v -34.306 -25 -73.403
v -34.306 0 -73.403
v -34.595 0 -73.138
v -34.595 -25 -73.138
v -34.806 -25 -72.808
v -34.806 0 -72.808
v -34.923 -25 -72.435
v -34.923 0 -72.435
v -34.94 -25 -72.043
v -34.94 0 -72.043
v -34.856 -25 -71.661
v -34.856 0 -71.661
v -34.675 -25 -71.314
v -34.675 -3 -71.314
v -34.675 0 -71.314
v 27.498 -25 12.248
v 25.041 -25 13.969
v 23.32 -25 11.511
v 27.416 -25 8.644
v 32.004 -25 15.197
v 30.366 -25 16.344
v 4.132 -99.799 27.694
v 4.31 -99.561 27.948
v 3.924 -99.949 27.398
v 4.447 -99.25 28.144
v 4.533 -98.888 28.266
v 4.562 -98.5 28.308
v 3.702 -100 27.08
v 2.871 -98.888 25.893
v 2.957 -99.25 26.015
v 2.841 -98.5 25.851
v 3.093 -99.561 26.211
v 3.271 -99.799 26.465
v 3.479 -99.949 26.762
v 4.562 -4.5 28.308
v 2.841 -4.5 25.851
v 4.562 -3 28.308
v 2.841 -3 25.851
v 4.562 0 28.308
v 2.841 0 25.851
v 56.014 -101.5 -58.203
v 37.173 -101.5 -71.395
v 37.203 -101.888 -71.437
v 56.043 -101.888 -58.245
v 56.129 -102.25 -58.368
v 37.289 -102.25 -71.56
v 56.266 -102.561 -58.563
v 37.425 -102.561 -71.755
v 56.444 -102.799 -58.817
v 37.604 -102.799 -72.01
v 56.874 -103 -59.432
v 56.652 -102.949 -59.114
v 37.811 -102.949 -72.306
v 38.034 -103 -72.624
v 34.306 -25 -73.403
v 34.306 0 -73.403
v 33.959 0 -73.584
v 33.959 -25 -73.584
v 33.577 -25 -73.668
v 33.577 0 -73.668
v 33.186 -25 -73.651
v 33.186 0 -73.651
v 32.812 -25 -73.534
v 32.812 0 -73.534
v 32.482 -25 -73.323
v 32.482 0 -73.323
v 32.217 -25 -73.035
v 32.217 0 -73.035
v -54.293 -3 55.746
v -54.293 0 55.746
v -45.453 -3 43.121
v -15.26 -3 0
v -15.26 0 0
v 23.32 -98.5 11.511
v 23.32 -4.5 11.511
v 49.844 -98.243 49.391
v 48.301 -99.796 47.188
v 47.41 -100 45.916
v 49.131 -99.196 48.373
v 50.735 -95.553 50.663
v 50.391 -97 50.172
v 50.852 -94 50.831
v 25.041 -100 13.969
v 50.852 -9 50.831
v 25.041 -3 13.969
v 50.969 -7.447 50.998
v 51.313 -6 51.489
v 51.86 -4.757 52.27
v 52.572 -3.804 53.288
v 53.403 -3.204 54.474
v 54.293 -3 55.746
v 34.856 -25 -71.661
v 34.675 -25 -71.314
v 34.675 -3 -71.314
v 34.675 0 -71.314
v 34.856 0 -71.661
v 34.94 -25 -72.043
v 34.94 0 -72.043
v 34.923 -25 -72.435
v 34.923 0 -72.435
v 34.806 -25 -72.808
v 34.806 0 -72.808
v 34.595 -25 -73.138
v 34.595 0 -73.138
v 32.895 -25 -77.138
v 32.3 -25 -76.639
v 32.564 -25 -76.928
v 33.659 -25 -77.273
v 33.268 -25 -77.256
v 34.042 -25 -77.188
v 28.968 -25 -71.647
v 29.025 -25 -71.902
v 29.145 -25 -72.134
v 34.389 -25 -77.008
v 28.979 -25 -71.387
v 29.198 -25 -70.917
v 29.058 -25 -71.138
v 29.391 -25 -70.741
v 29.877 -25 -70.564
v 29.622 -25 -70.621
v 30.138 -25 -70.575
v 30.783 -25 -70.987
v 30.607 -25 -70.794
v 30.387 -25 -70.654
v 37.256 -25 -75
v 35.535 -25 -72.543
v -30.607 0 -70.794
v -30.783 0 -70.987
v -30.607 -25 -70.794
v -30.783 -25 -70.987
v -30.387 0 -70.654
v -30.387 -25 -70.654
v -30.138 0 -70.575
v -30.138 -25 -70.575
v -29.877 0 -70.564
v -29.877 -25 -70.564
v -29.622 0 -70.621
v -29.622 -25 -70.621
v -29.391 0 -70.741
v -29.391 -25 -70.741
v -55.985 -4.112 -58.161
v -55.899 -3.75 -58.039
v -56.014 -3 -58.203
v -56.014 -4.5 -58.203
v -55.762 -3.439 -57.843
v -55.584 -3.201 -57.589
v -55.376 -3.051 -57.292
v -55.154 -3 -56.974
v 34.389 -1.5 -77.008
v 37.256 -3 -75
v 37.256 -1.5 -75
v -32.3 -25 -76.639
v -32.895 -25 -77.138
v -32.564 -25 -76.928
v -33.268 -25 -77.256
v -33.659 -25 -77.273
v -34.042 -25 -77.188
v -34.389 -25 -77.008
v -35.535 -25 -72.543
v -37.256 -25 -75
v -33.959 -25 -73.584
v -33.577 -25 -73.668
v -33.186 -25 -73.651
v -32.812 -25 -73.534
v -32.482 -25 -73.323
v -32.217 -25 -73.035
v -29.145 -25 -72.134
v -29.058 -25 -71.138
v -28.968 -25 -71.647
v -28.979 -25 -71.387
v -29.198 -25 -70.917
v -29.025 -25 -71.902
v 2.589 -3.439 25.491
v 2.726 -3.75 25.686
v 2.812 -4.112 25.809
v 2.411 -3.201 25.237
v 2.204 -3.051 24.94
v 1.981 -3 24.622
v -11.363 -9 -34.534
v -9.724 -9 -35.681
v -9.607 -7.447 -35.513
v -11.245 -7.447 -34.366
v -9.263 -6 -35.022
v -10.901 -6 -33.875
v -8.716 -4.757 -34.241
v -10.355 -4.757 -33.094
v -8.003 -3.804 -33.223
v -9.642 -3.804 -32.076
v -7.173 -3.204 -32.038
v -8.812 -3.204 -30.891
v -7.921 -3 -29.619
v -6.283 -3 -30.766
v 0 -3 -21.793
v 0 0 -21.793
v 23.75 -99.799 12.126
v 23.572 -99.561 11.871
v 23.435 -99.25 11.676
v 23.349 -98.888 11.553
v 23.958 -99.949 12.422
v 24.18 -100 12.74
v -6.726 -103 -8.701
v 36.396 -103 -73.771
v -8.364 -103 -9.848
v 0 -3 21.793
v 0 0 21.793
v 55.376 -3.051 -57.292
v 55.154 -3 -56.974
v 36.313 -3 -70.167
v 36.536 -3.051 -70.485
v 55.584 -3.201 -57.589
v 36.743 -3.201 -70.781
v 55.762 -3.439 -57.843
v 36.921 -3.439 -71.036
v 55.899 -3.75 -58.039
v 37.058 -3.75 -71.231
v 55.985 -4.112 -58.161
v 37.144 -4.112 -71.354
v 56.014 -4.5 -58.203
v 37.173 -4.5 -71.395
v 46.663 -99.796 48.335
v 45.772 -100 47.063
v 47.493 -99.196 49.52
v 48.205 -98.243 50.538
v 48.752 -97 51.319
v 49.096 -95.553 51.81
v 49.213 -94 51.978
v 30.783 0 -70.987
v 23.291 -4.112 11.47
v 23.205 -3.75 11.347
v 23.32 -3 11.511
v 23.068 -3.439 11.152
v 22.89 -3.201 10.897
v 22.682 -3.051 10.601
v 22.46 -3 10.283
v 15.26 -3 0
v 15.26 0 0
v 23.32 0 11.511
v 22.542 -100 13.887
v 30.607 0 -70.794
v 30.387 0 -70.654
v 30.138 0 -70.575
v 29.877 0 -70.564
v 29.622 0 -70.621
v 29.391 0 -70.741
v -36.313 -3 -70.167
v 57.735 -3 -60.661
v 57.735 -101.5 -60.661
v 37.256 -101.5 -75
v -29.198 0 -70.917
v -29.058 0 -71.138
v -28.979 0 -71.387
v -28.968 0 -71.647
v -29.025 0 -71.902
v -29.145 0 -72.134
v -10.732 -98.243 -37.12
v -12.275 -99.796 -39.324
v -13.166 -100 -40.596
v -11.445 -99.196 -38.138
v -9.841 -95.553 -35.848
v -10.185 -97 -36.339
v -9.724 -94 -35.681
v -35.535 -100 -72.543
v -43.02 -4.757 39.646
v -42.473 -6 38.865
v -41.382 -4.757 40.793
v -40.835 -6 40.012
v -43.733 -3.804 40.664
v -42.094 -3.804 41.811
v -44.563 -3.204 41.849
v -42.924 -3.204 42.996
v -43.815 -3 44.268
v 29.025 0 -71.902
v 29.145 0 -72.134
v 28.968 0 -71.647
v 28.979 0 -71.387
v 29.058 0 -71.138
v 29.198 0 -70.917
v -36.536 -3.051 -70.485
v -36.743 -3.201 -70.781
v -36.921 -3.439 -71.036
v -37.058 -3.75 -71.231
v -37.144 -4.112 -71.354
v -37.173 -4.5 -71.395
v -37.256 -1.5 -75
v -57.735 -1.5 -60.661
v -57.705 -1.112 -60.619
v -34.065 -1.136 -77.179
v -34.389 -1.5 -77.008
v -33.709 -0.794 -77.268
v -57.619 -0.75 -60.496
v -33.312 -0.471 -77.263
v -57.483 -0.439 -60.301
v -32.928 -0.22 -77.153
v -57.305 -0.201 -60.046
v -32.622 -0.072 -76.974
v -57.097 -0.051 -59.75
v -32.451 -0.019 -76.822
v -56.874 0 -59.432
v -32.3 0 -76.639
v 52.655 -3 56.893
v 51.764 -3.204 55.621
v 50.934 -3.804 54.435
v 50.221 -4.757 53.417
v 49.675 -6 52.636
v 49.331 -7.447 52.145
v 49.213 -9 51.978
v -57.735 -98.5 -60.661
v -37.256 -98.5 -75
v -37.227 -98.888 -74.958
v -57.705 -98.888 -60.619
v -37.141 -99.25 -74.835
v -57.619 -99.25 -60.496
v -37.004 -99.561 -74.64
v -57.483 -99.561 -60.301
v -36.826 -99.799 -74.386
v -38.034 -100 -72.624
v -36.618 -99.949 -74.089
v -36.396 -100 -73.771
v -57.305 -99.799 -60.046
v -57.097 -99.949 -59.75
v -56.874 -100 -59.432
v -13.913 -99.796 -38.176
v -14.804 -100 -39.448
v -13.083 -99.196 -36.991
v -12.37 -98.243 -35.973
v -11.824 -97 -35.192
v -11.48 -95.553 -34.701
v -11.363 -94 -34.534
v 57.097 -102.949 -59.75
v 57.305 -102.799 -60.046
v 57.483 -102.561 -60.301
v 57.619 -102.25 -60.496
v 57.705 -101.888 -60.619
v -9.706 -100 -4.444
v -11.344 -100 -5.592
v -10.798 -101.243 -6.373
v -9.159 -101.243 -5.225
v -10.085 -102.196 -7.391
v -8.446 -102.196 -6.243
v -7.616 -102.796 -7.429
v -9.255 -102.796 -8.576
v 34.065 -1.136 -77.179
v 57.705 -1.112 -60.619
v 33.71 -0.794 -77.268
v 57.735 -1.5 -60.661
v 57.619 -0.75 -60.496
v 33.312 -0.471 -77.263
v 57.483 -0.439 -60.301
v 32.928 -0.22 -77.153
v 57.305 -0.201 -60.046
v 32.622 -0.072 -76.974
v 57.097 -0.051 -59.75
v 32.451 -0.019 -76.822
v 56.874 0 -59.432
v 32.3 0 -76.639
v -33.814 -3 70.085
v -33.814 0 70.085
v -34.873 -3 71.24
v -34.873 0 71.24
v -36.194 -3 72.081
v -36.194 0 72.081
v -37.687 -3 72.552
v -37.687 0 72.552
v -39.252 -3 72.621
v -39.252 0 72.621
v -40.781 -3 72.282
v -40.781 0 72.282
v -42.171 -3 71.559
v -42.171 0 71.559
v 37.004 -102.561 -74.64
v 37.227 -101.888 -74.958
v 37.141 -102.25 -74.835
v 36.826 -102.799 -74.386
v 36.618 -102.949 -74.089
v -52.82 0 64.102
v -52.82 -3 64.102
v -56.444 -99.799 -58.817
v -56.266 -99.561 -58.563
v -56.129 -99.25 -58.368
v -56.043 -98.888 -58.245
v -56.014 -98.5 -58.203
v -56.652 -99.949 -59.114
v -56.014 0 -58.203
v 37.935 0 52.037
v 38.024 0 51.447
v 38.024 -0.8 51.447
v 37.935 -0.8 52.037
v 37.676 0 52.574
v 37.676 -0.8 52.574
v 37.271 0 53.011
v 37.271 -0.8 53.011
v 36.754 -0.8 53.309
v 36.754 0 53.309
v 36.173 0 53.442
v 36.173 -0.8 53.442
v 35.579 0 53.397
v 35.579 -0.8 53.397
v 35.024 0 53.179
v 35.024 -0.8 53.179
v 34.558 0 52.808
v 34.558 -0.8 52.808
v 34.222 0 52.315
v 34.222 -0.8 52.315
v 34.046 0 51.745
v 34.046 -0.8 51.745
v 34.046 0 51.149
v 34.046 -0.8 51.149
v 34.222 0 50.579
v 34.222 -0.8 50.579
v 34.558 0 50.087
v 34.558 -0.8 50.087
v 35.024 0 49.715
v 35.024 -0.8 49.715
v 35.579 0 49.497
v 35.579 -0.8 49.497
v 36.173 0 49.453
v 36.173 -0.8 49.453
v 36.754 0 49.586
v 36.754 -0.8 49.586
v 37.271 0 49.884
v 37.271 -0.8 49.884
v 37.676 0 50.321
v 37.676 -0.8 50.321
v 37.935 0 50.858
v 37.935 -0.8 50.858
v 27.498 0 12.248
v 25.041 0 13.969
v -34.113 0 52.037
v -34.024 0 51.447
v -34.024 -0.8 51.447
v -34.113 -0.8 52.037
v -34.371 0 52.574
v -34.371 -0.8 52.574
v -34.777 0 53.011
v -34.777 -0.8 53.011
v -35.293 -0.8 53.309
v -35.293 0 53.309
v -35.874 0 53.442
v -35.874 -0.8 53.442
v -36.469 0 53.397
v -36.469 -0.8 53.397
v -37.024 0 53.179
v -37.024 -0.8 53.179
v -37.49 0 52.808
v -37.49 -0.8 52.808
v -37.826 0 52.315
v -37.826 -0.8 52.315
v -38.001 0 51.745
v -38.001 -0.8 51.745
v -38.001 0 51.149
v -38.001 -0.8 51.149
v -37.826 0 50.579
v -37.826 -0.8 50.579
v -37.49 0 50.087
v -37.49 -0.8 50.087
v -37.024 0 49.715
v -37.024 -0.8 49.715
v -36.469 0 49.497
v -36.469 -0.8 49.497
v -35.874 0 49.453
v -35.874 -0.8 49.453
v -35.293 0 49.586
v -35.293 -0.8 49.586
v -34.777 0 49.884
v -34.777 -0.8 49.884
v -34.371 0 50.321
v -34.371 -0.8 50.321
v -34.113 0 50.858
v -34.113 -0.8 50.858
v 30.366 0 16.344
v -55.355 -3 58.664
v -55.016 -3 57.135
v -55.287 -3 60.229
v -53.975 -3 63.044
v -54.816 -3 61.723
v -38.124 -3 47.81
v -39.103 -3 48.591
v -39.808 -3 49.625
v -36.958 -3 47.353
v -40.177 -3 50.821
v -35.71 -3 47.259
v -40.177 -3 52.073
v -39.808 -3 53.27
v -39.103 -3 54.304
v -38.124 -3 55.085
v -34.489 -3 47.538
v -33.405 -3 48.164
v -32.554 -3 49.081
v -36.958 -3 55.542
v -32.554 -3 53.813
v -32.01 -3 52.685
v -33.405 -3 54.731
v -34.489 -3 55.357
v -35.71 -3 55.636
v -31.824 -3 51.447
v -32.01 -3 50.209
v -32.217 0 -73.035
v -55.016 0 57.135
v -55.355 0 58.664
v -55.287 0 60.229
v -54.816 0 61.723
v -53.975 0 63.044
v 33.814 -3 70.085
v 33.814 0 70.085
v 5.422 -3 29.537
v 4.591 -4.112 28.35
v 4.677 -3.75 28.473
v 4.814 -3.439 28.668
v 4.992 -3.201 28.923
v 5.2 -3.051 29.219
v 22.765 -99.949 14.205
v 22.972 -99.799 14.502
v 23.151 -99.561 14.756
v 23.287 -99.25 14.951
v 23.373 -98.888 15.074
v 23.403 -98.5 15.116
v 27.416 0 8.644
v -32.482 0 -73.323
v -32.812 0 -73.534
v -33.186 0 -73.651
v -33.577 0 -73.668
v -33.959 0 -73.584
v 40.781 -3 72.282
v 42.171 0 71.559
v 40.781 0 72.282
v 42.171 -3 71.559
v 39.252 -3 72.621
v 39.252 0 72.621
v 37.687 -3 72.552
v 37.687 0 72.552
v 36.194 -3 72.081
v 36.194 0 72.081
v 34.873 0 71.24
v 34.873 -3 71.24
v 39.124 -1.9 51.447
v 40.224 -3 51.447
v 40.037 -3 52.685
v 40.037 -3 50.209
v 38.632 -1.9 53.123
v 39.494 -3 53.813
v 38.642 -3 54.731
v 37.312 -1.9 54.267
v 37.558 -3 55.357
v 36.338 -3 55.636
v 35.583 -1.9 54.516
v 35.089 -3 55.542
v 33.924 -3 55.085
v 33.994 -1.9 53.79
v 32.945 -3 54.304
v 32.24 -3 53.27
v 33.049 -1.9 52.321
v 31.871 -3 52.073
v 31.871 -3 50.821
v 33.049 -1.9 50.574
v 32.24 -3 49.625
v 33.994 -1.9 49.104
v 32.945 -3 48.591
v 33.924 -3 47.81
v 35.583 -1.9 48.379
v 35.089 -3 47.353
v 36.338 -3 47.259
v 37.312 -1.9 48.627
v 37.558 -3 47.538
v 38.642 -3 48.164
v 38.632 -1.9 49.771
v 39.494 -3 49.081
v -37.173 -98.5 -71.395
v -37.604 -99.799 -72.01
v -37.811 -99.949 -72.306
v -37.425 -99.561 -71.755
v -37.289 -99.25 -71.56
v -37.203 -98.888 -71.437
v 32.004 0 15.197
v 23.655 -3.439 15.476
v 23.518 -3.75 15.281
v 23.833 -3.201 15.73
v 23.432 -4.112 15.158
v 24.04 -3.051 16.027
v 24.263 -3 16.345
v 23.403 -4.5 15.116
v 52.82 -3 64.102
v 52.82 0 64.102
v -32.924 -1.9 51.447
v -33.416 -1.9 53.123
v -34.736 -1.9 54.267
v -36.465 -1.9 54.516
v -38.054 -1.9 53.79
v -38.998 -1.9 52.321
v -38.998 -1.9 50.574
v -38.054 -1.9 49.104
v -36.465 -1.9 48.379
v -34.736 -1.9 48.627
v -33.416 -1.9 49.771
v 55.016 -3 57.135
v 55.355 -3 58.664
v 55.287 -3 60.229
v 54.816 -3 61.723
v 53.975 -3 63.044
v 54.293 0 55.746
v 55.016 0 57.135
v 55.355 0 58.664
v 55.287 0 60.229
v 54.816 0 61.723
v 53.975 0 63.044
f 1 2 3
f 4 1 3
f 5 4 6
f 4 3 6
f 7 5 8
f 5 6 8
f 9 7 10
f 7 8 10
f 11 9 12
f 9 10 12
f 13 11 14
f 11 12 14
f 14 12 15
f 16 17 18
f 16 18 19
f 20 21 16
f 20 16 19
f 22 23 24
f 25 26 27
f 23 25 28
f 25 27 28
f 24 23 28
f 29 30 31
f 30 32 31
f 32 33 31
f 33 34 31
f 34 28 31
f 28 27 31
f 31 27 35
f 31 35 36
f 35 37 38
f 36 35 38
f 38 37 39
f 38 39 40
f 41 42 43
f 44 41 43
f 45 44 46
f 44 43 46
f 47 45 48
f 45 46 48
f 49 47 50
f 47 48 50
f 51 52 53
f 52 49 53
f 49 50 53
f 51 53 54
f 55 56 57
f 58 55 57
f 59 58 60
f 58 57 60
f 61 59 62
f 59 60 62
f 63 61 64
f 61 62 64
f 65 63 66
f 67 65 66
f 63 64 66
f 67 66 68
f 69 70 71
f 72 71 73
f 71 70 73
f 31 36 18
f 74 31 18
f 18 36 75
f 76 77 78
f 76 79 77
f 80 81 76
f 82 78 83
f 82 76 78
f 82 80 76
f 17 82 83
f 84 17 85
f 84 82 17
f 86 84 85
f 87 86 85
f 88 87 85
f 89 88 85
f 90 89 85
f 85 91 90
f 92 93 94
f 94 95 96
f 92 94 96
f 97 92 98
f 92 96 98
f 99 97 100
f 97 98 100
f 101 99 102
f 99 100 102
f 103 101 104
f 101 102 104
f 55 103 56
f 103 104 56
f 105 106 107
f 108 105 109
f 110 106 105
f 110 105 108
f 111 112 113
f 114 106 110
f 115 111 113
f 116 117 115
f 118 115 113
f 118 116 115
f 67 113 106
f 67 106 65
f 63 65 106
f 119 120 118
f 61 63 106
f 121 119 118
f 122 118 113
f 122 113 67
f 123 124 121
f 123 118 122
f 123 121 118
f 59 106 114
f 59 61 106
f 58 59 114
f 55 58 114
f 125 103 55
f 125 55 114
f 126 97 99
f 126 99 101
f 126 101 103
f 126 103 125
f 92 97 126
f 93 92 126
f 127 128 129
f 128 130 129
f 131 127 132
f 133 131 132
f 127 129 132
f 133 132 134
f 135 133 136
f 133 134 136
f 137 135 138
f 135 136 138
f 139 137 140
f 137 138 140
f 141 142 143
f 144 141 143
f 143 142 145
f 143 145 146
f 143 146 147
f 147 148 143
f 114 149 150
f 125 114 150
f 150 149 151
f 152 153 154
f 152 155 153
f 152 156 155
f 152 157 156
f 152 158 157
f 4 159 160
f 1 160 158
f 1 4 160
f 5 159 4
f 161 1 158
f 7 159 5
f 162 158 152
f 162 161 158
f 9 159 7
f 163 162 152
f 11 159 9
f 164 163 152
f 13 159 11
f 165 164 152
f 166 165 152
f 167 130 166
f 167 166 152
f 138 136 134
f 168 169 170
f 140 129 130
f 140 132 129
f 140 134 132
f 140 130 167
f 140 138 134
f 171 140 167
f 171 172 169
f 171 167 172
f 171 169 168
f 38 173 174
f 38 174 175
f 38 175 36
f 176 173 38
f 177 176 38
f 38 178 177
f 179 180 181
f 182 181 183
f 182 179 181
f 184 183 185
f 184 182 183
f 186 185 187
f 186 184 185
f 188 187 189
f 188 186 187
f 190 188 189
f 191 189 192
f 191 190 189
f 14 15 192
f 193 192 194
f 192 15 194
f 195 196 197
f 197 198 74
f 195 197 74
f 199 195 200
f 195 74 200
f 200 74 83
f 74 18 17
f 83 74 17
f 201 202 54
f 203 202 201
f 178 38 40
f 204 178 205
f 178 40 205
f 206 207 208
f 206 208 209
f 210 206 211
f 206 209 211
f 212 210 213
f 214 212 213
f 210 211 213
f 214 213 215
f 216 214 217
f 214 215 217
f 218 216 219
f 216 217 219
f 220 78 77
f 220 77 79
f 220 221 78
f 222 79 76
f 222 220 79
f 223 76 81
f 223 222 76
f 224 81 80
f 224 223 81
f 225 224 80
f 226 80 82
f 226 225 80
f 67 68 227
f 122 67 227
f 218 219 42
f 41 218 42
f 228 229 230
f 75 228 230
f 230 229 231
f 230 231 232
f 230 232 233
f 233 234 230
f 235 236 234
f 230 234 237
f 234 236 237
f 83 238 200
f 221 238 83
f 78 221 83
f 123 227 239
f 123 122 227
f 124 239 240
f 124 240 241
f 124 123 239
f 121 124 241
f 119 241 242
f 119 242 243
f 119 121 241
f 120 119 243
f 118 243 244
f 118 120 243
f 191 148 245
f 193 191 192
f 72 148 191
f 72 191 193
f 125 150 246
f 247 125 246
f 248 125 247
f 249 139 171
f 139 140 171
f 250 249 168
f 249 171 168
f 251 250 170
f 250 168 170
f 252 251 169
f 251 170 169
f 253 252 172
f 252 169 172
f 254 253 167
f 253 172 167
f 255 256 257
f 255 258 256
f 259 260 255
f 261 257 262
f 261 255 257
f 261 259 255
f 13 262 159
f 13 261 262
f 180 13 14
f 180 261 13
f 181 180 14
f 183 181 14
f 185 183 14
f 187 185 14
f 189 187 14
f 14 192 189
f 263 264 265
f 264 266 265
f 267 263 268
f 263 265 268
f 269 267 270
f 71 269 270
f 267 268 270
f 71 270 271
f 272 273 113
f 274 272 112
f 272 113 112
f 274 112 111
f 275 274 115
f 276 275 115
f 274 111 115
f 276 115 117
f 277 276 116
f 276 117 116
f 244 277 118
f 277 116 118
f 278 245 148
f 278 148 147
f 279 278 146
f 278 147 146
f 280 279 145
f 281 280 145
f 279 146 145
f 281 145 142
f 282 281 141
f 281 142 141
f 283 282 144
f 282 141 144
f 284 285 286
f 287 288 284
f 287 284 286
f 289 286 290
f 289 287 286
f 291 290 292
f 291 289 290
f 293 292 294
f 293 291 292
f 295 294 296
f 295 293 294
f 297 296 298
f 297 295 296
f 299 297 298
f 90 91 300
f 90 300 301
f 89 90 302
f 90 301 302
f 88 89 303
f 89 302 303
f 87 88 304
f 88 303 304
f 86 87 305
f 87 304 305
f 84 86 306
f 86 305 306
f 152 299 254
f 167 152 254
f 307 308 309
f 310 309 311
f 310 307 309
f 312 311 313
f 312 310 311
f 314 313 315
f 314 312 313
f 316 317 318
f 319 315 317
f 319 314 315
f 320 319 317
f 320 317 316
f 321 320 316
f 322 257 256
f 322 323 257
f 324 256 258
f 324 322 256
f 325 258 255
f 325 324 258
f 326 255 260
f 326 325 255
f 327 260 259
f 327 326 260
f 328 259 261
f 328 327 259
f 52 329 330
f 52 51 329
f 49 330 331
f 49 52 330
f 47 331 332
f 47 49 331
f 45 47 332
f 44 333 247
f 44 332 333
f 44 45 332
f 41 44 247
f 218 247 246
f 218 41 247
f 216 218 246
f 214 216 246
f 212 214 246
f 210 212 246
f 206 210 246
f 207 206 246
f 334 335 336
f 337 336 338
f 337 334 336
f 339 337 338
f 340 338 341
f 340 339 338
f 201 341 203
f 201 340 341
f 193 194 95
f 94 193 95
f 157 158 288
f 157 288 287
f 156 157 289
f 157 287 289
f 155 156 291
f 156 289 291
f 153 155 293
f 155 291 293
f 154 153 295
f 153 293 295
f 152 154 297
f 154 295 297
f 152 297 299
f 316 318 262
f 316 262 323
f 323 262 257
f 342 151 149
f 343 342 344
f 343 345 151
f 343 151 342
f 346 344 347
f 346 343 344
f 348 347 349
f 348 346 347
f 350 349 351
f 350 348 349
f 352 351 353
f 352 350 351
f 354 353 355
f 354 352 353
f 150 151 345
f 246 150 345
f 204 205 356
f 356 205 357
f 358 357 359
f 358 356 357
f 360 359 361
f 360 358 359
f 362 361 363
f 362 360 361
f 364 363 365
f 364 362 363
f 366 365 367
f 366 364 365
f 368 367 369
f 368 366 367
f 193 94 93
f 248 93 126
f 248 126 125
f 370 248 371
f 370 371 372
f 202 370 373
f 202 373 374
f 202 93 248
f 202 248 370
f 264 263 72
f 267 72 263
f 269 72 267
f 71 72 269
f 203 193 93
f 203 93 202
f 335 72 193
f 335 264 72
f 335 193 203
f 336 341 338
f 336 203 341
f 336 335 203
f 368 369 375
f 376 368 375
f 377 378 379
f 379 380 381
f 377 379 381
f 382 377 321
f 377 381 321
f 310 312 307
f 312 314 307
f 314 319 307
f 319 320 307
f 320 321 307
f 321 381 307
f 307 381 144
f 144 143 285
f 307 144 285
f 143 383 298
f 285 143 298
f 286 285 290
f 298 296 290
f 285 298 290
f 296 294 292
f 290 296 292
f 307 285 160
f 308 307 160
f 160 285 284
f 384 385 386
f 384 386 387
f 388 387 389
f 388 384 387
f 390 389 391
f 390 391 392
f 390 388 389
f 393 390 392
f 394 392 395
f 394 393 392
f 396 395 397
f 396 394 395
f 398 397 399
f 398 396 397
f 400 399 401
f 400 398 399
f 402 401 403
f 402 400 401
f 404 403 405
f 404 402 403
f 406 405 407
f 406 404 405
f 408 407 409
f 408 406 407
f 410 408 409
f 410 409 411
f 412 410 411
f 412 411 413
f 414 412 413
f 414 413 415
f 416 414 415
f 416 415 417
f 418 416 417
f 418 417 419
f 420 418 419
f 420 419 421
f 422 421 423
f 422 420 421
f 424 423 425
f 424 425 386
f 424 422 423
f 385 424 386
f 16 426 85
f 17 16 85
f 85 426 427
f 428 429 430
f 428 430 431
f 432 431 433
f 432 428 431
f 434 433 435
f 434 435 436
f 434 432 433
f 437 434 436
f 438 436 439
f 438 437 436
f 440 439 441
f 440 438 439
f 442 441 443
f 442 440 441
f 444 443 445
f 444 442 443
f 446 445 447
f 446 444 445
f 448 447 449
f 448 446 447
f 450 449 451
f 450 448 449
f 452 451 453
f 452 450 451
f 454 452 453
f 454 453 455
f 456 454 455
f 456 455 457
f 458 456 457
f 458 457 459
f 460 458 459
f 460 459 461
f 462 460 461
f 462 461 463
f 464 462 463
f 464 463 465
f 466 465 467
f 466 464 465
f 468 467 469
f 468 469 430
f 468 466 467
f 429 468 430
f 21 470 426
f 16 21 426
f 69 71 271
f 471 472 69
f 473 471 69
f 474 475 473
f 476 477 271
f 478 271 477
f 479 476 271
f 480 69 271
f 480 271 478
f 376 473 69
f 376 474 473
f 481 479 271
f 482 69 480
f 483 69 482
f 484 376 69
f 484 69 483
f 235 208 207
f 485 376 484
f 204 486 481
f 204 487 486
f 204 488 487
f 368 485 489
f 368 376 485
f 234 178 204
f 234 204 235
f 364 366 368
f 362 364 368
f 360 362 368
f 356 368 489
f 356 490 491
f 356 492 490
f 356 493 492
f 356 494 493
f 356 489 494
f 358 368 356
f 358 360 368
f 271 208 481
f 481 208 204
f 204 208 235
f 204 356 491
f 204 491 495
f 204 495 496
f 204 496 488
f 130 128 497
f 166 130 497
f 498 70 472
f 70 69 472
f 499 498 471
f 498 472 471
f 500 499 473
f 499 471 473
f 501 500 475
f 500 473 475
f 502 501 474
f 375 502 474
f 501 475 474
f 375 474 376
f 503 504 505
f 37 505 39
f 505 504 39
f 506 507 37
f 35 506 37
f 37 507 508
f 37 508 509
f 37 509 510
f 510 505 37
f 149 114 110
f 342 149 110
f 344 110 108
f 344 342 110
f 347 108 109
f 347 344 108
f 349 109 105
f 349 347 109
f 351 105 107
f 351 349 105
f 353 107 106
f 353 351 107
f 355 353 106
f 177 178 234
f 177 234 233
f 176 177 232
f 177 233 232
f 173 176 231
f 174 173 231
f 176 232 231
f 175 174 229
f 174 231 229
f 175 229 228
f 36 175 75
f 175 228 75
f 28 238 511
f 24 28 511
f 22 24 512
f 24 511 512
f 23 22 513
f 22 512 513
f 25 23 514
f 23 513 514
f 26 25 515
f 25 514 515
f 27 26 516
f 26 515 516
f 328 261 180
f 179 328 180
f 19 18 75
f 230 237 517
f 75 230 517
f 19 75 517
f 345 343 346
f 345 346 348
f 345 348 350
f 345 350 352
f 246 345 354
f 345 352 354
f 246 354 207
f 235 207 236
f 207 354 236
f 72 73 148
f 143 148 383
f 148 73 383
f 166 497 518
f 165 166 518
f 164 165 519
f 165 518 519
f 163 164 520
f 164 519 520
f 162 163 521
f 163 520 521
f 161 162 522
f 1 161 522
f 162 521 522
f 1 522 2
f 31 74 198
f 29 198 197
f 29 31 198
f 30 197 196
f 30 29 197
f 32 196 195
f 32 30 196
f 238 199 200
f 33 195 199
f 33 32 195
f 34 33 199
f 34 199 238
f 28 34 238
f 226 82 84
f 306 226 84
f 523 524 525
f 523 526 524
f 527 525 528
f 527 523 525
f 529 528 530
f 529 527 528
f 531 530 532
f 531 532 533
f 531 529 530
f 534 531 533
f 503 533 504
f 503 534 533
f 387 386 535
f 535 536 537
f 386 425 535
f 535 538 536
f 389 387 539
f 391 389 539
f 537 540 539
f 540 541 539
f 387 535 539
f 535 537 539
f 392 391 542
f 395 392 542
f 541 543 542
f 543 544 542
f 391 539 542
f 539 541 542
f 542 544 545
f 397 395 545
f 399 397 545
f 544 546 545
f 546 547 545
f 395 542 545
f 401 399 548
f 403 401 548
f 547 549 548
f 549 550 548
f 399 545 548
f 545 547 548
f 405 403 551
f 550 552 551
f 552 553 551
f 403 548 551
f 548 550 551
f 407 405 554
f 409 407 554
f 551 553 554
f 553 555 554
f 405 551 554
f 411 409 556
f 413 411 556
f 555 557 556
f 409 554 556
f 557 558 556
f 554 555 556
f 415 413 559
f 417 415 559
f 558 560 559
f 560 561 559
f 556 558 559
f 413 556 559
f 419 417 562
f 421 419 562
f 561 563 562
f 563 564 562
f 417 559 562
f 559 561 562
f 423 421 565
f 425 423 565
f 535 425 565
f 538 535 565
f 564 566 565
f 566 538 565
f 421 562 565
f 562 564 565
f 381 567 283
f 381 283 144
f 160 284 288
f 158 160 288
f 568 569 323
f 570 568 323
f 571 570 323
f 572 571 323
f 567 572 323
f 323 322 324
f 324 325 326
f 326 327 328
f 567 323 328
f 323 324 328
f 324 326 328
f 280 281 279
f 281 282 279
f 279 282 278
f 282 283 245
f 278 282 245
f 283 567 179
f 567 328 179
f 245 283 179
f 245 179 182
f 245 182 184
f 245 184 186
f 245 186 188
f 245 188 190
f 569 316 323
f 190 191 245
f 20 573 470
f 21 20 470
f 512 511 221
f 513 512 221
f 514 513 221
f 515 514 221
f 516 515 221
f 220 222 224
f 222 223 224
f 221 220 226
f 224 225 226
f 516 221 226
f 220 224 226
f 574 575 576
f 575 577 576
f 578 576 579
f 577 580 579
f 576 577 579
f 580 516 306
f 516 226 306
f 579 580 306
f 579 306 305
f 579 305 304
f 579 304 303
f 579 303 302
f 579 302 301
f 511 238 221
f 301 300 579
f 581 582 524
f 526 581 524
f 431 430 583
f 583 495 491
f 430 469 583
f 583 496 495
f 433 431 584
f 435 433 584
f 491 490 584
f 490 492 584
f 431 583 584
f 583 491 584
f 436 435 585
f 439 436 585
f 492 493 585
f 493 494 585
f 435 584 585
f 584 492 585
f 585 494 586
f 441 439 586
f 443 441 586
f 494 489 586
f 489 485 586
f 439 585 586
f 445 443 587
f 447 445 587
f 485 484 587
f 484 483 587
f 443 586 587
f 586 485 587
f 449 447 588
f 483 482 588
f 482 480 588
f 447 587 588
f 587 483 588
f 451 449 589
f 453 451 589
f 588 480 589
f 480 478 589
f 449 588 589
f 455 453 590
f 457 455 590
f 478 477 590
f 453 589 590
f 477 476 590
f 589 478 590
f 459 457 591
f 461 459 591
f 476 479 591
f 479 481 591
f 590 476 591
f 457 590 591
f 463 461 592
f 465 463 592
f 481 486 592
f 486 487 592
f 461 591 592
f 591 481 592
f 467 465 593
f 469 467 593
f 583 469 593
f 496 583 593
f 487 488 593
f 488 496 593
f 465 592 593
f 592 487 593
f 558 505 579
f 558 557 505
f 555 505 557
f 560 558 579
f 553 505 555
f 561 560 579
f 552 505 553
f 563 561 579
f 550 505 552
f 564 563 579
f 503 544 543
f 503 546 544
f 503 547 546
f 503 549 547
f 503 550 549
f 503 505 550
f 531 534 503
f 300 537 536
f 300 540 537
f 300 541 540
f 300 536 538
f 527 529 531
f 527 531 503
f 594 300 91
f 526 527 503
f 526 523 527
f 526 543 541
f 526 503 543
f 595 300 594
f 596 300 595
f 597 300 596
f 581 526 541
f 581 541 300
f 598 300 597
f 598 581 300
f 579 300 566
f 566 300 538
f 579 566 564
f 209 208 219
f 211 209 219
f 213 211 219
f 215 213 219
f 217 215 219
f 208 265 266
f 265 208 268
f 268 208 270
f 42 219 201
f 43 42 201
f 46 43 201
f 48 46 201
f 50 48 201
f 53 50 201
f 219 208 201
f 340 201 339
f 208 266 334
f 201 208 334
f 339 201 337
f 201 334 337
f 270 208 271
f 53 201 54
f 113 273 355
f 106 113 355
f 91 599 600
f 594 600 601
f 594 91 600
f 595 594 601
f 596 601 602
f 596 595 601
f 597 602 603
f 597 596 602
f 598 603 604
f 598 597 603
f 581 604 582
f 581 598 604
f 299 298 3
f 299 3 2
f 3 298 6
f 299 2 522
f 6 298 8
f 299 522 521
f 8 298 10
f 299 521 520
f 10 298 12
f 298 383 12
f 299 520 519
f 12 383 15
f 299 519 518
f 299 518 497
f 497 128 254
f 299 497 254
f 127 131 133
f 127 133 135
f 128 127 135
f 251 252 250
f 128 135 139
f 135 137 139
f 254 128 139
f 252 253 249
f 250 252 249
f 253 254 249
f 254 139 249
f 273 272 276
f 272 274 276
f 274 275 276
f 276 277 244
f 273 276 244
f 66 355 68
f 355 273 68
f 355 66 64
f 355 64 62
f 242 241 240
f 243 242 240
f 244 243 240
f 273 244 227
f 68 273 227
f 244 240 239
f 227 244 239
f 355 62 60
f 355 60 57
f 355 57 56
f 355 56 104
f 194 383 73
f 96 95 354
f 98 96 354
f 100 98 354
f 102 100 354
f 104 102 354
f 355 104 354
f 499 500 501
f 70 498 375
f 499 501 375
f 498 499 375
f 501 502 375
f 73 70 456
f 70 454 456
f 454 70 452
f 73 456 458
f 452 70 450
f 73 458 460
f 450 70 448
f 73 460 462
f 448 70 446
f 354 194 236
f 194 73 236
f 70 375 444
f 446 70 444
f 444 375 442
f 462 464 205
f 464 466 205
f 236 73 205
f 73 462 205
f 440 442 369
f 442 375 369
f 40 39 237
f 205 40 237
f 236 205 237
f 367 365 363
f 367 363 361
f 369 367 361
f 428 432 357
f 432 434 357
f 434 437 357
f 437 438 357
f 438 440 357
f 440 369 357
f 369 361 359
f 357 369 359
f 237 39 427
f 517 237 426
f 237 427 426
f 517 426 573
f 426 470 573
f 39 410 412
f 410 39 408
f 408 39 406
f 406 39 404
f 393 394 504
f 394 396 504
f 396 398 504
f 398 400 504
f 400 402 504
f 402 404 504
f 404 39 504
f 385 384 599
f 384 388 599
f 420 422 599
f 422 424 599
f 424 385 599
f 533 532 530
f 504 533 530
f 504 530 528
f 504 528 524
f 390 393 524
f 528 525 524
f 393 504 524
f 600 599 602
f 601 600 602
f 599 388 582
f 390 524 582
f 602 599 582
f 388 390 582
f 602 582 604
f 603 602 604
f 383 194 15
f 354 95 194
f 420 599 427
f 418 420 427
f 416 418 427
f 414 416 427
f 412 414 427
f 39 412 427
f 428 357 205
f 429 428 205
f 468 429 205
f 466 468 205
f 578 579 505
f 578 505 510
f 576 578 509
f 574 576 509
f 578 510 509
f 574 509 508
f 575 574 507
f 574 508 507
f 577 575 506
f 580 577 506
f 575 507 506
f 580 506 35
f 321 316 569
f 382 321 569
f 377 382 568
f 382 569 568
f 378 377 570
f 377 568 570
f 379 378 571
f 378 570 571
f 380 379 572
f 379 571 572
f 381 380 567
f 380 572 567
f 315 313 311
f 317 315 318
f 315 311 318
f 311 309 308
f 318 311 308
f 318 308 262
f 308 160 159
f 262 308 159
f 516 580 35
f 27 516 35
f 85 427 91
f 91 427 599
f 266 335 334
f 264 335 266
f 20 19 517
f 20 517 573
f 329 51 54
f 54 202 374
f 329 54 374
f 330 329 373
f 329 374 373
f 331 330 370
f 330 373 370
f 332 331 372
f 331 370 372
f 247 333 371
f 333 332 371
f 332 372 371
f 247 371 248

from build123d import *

# Parameters (mm, degrees)
F0_R          = 2
F1_DEPTH      = 3
F4_DEPTH      = 2
F3_W          = 100
F3_H          = 3
F5_DEPTH      = 25
F6_DEPTH      = 25
F7_DEPTH      = 100
F9_W          = 97
F9_H          = 45
F10_DEPTH     = 2
F11_R         = 5.99999
F12_T1_DEPTH  = 23
F12_T3_DEPTH  = 25
F12_T5_DEPTH  = 23
F12_T7_DEPTH  = 25
F12_T9_DEPTH  = 32.5
F12_T11_DEPTH = 26.75
F12_T13_DEPTH = 32.5
F12_T15_DEPTH = 26.75
F12_T17_DEPTH = 37.5
F12_T19_DEPTH = 37.5
F12_T21_DEPTH = 32.5
F13_R         = 0.99999
F14_SIZE      = 2.2


# Not quite as in the source:
# - a fillet or chamfer that OpenCascade refuses, or shapes differently, is made with other operations: its cross-section is extruded or revolved along the edge and cut away or added
# - a fillet or chamfer is up to 0.001 mm smaller than in the source, because OpenCascade refuses the exact size
# - a feature names something its author has since deleted; it is built from what else it names


with BuildPart() as f1:
    # F0 (on Front) → F1 (new body)
    with BuildSketch(Plane.XZ):
        Polygon((-15.2596823595, 0), (0, 21.7930849453), (-37.2558830062, 75), (-57.7346841134, 60.6605890912), align=None)
        with Locations((-36.0237548328, 51.4472536598)):
            Circle(F0_R, mode=Mode.SUBTRACT)
        Polygon((0, -21.7930849453), (15.2596823595, 0), (0, 21.7930849453), (-15.2596823595, 0), align=None)
        Polygon((25.0408272414, 13.9689225668), (57.7346841134, 60.6605890912), (37.2558830062, 75), (4.5620261342, 28.3083334755), align=None)
        with Locations((36.0237548328, 51.4472536598)):
            Circle(F0_R, mode=Mode.SUBTRACT)
        Polygon((15.2596823595, 0), (23.3200979324, 11.5114664339), (2.8412968251, 25.8508773427), (0, 21.7930849453), align=None)
        Polygon((23.3200979324, 11.5114664339), (25.0408272414, 13.9689225668), (4.5620261342, 28.3083334755), (2.8412968251, 25.8508773427), align=None)
        Polygon((-35.5351536972, -72.5425438671), (0, -21.7930849453), (-15.2596823595, 0), (-56.0139548044, -58.2031329584), align=None)
        Polygon((57.7346841134, -60.6605890912), (15.2596823595, 0), (0, -21.7930849453), (35.5351536972, -72.5425438671), (37.2558830062, -75), align=None)
        Polygon((-37.2558830062, -75), (-35.5351536972, -72.5425438671), (-56.0139548044, -58.2031329584), (-57.7346841134, -60.6605890912), align=None)
    extrude(amount=F1_DEPTH)

    # F3 (on offset) → F4 (join)
    with BuildSketch(Plane(origin=(-10.2394005536, 0, -7.1697054544), x_dir=(0, -1, 0), z_dir=(-0.8191520443, 0, -0.5735764364))):
        Polygon((3, -79.8054999295), (103, -79.8054999295), (103, 0.1945000705), (83, 0.1945000705), (90.1471648731, -3.9319174929), (90.1471648731, -52.514305784), (48.0735824366, -76.8054999295), (6, -52.514305784), (6, -3.9319174929), (13.1471648731, 0.1945000705), (3, 0.1945000705), align=None)
        Polygon((83, 0.1945000705), (103, 0.1945000705), (3, 57.9295269895), (3, 0.1945000705), (13.1471648731, 0.1945000705), (48.0735824366, 20.3592766526), align=None)
        Polygon((90.1471648731, -3.9319174929), (83, 0.1945000705), (13.1471648731, 0.1945000705), (6, -3.9319174929), (6, -52.514305784), (48.0735824366, -76.8054999295), (90.1471648731, -52.514305784), align=None)
        Polygon((13.1471648731, 0.1945000705), (83, 0.1945000705), (48.0735824366, 20.3592766526), align=None)
    extrude(amount=-F4_DEPTH)

    # F3 (on offset) → F5 (join)
    with BuildSketch(Plane(origin=(-10.2394005536, 0, -7.1697054544), x_dir=(0, -1, 0), z_dir=(-0.8191520443, 0, -0.5735764364))):
        with Locations((53, -81.3054999295)):
            Rectangle(F3_W, F3_H)
    extrude(amount=-F5_DEPTH)

    # F0 (on Front) → F6 (join)
    with BuildSketch(Plane.XZ):
        Polygon((-33.0776975643, -74.2632731762), (-35.5351536972, -72.5425438671), (-37.2558830062, -75), (-33.1601227848, -77.8678821818), (-28.571511294, -71.3146658274), (-30.2098153825, -70.1675129547), align=None)
        Polygon((37.2558830062, -75), (35.5351536972, -72.5425438671), (33.0776975643, -74.2632731762), (30.2098153825, -70.1675129547), (28.571511294, -71.3146658274), (33.1601227848, -77.8678821818), align=None)
        Polygon((27.4982833743, 12.2481932577), (25.0408272414, 13.9689225668), (23.3200979324, 11.5114664339), (27.4158581538, 8.6435842521), (32.0044696446, 15.1968006064), (30.366165556, 16.3439534791), align=None)
    extrude(amount=F6_DEPTH)

    # F0 (on Front) → F7 (join)
    with BuildSketch(Plane.XZ):
        Polygon((-37.2558830062, -75), (-35.5351536972, -72.5425438671), (-56.0139548044, -58.2031329584), (-57.7346841134, -60.6605890912), align=None)
        Polygon((23.3200979324, 11.5114664339), (25.0408272414, 13.9689225668), (4.5620261342, 28.3083334755), (2.8412968251, 25.8508773427), align=None)
    extrude(amount=F7_DEPTH)

    # F9 (on offset) → F10 (join)
    with BuildSketch(Plane(origin=(10.2394005536, 0, -7.1697054544), x_dir=(0, 1, 0), z_dir=(0.8191520443, 0, -0.5735764364))):
        with Locations((-51.5, -57.3054999295)):
            Rectangle(F9_W, F9_H)
        Polygon((-94, -57.3054999295), (-84.4737205584, -40.8054999295), (-65.4211616751, -40.8054999295), (-55.8948822335, -57.3054999295), (-65.4211616751, -73.8054999295), (-84.4737205584, -73.8054999295), align=None, mode=Mode.SUBTRACT)
        Polygon((-9, -57.3054999295), (-18.5262794416, -73.8054999295), (-37.5788383249, -73.8054999295), (-47.1051177665, -57.3054999295), (-37.5788383249, -40.8054999295), (-18.5262794416, -40.8054999295), align=None, mode=Mode.SUBTRACT)
        with Locations((-51.5, 48.3054999295)):
            Rectangle(F9_W, F9_H)
        Polygon((-55.8948822335, 48.3054999295), (-65.4211616751, 31.8054999295), (-84.4737205584, 31.8054999295), (-94, 48.3054999295), (-84.4737205584, 64.8054999295), (-65.4211616751, 64.8054999295), align=None, mode=Mode.SUBTRACT)
        Polygon((-9, 48.3054999295), (-18.5262794416, 31.8054999295), (-37.5788383249, 31.8054999295), (-47.1051177665, 48.3054999295), (-37.5788383249, 64.8054999295), (-18.5262794416, 64.8054999295), align=None, mode=Mode.SUBTRACT)
        Polygon((-84.4737205584, 31.8054999295), (-65.4211616751, 31.8054999295), (-55.8948822335, 48.3054999295), (-65.4211616751, 64.8054999295), (-84.4737205584, 64.8054999295), (-94, 48.3054999295), align=None)
        Polygon((-37.5788383249, 31.8054999295), (-18.5262794416, 31.8054999295), (-9, 48.3054999295), (-18.5262794416, 64.8054999295), (-37.5788383249, 64.8054999295), (-47.1051177665, 48.3054999295), align=None)
        Polygon((-65.4211616751, -40.8054999295), (-84.4737205584, -40.8054999295), (-94, -57.3054999295), (-84.4737205584, -73.8054999295), (-65.4211616751, -73.8054999295), (-55.8948822335, -57.3054999295), align=None)
        Polygon((-37.5788383249, -73.8054999295), (-18.5262794416, -73.8054999295), (-9, -57.3054999295), (-18.5262794416, -40.8054999295), (-37.5788383249, -40.8054999295), (-47.1051177665, -57.3054999295), align=None)
    extrude(amount=-F10_DEPTH)

    # F11 (radius 6 in the source; OpenCascade refuses exactly that, so slightly less here)
    f11_edges = [f1.edges().sort_by_distance(p)[0] for p in [
        (-10.543366, -3, -35.107125),
        (-10.543366, -100, -35.107125),
        (50.032615, -100, 51.404341),
        (50.032615, -3, 51.404341),
        (-42.64726, -3, 40.856961),
        (-9.531809, -103, -6.436804),
        (-57.734684, -1.5, 60.660589),
        (-37.255883, -1.5, 75),
        (37.255883, -1.5, 75),
        (57.734684, -1.5, 60.660589),
    ]]
    fillet(f11_edges, radius=F11_R)

    # F12: fillet of radius 1.5 on 18 edges, made by hand

    # F12_s2 → F12_t1 (join)
    with BuildSketch(Plane(origin=(-10.2394005536, 0, 7.1697054544), x_dir=(0, 1, 0), z_dir=(0.8191520443, 0, -0.5735764364))):
        with BuildLine():
            ThreePointArc((-3, 27.3054999295), (-3.4393398282, 26.2448397577), (-4.5, 25.8054999295))
            Line((-4.5, 25.8054999295), (-3, 25.8054999295))
            Line((-3, 25.8054999295), (-3, 27.3054999295))
        make_face()
        with BuildLine():
            ThreePointArc((-3, -78.3054999295), (-3.4393398282, -79.3661601013), (-4.5, -79.8054999295))
            Line((-4.5, -79.8054999295), (-3, -79.8054999295))
            Line((-3, -79.8054999295), (-3, -78.3054999295))
        make_face()
    extrude(amount=F12_T1_DEPTH)

    # F12_s4 → F12_t3 (join)
    with BuildSketch(Plane(origin=(10.2394005536, 0, -7.1697054544), x_dir=(0, 1, 0), z_dir=(-0.8191520443, 0, 0.5735764364))):
        with BuildLine():
            ThreePointArc((-3, -21.3054999295), (-3.4393398282, -22.3661601013), (-4.5, -22.8054999295))
            Line((-4.5, -22.8054999295), (-3, -22.8054999295))
            Line((-3, -22.8054999295), (-3, -21.3054999295))
        make_face()
    extrude(amount=F12_T3_DEPTH)

    # F12_s6 → F12_t5 (join)
    with BuildSketch(Plane(origin=(-8.601096465, 0, -6.0225525817), x_dir=(0, 1, 0), z_dir=(0.8191520443, 0, 0.5735764364))):
        with BuildLine():
            ThreePointArc((-3, -78.3054999295), (-3.4393398282, -79.3661601013), (-4.5, -79.8054999295))
            Line((-4.5, -79.8054999295), (-3, -79.8054999295))
            Line((-3, -79.8054999295), (-3, -78.3054999295))
        make_face()
    extrude(amount=F12_T5_DEPTH)

    # F12_s8 → F12_t7 (join)
    with BuildSketch(Plane.XZ):
        with BuildLine():
            ThreePointArc((34.6747890426, -71.3138158007), (34.9232726057, -72.4346527217), (34.3064256307, -73.4029085217))
            Line((34.3064256307, -73.4029085217), (35.5351536972, -72.5425438671))
            Line((35.5351536972, -72.5425438671), (34.6747890426, -71.3138158007))
        make_face()
        with BuildLine():
            ThreePointArc((-32.2173329098, -73.0345451098), (-33.1855887097, -73.6513920847), (-34.3064256307, -73.4029085217))
            Line((-34.3064256307, -73.4029085217), (-33.0776975643, -74.2632731762))
            Line((-33.0776975643, -74.2632731762), (-32.2173329098, -73.0345451098))
        make_face()
        with BuildLine():
            ThreePointArc((-34.3064256307, -73.4029085217), (-34.9232726057, -72.4346527217), (-34.6747890426, -71.3138158007))
            Line((-34.6747890426, -71.3138158007), (-35.5351536972, -72.5425438671))
            Line((-35.5351536972, -72.5425438671), (-34.3064256307, -73.4029085217))
        make_face()
        with BuildLine():
            ThreePointArc((34.3064256307, -73.4029085217), (33.1855887097, -73.6513920847), (32.2173329098, -73.0345451098))
            Line((32.2173329098, -73.0345451098), (33.0776975643, -74.2632731762))
            Line((33.0776975643, -74.2632731762), (34.3064256307, -73.4029085217))
        make_face()
    extrude(amount=F12_T7_DEPTH)

    # F12_s10 → F12_t9 (cut)
    with BuildSketch(Plane(origin=(-13.3112207197, 0, 9.3206170907), x_dir=(0, 1, 0), z_dir=(0.8191520443, 0, -0.5735764364))):
        with BuildLine():
            ThreePointArc((-98.5, -82.8054999295), (-99.5606601718, -82.3661601013), (-100, -81.3054999295))
            Line((-100, -81.3054999295), (-100, -82.8054999295))
            Line((-100, -82.8054999295), (-98.5, -82.8054999295))
        make_face()
        with BuildLine():
            ThreePointArc((-98.5, 22.8054999295), (-99.5606601718, 23.2448397577), (-100, 24.3054999295))
            Line((-100, 24.3054999295), (-100, 22.8054999295))
            Line((-100, 22.8054999295), (-98.5, 22.8054999295))
        make_face()
    extrude(amount=F12_T9_DEPTH, mode=Mode.SUBTRACT)

    # F12_s12 → F12_t11 (cut)
    with BuildSketch(Plane(origin=(8.601096465, 0, -6.0225525817), x_dir=(0, 1, 0), z_dir=(-0.8191520443, 0, 0.5735764364))):
        with BuildLine():
            ThreePointArc((-100, -24.3054999295), (-99.5606601718, -25.3661601013), (-98.5, -25.8054999295))
            Line((-98.5, -25.8054999295), (-100, -25.8054999295))
            Line((-100, -25.8054999295), (-100, -24.3054999295))
        make_face()
        with BuildLine():
            ThreePointArc((-100, 81.3054999295), (-99.5606601718, 80.2448397577), (-98.5, 79.8054999295))
            Line((-98.5, 79.8054999295), (-100, 79.8054999295))
            Line((-100, 79.8054999295), (-100, 81.3054999295))
        make_face()
    extrude(amount=F12_T11_DEPTH, mode=Mode.SUBTRACT)

    # F12_s14 → F12_t13 (cut)
    with BuildSketch(Plane(origin=(-13.3112207197, 0, -9.3206170907), x_dir=(0, 1, 0), z_dir=(0.8191520443, 0, 0.5735764364))):
        with BuildLine():
            ThreePointArc((-103, -81.3054999295), (-102.5606601718, -82.3661601013), (-101.5, -82.8054999295))
            Line((-101.5, -82.8054999295), (-103, -82.8054999295))
            Line((-103, -82.8054999295), (-103, -81.3054999295))
        make_face()
    extrude(amount=F12_T13_DEPTH, mode=Mode.SUBTRACT)

    # F12_s16 → F12_t15 (cut)
    with BuildSketch(Plane(origin=(-8.601096465, 0, -6.0225525817), x_dir=(0, 1, 0), z_dir=(0.8191520443, 0, 0.5735764364))):
        with BuildLine():
            ThreePointArc((-101.5, -79.8054999295), (-102.5606601718, -80.2448397577), (-103, -81.3054999295))
            Line((-103, -81.3054999295), (-103, -79.8054999295))
            Line((-103, -79.8054999295), (-101.5, -79.8054999295))
        make_face()
    extrude(amount=F12_T15_DEPTH, mode=Mode.SUBTRACT)

    # F12_s18 → F12_t17 (cut)
    with BuildSketch(Plane(origin=(17.4069809411, 0, -12.1884992725), x_dir=(0, 1, 0), z_dir=(-0.8191520443, 0, 0.5735764364))):
        with BuildLine():
            ThreePointArc((-1.5, 82.8054999295), (-0.4393398282, 82.3661601013), (0, 81.3054999295))
            Line((0, 81.3054999295), (0, 82.8054999295))
            Line((0, 82.8054999295), (-1.5, 82.8054999295))
        make_face()
    extrude(amount=F12_T17_DEPTH, mode=Mode.SUBTRACT)

    # F12_s20 → F12_t19 (cut)
    with BuildSketch(Plane(origin=(13.3112207197, 0, 9.3206170907), x_dir=(0, 1, 0), z_dir=(-0.8191520443, 0, -0.5735764364))):
        with BuildLine():
            ThreePointArc((-1.5, 82.8054999295), (-0.4393398282, 82.3661601013), (0, 81.3054999295))
            Line((0, 81.3054999295), (0, 82.8054999295))
            Line((0, 82.8054999295), (-1.5, 82.8054999295))
        make_face()
    extrude(amount=F12_T19_DEPTH, mode=Mode.SUBTRACT)

    # F12_s22 → F12_t21 (cut)
    with BuildSketch(Plane.XZ.offset(-3.75)):
        with BuildLine():
            ThreePointArc((34.3888508512, -77.0075175272), (33.2680139302, -77.2560010903), (32.2997581302, -76.6391541153))
            Line((32.2997581302, -76.6391541153), (33.1601227848, -77.8678821818))
            Line((33.1601227848, -77.8678821818), (34.3888508512, -77.0075175272))
        make_face()
        with BuildLine():
            ThreePointArc((-34.3888508512, -77.0075175272), (-33.2680139302, -77.2560010903), (-32.2997581302, -76.6391541153))
            Line((-32.2997581302, -76.6391541153), (-33.1601227848, -77.8678821818))
            Line((-33.1601227848, -77.8678821818), (-34.3888508512, -77.0075175272))
        make_face()
    extrude(amount=F12_T21_DEPTH, mode=Mode.SUBTRACT)

    # F13 (radius 1 in the source; OpenCascade refuses exactly that, so slightly less here)
    f13_edges = [f1.edges().sort_by_distance(p)[0] for p in [
        (-28.571511, -12.5, -71.314666),
        (28.571511, -12.5, -71.314666),
        (-30.209815, -12.5, -70.167513),
        (30.209815, -12.5, -70.167513),
    ]]
    fillet(f13_edges, radius=F13_R)

    # F14
    f14_edges = [f1.edges().sort_by_distance(p)[0] for p in [
        (-38.023755, -3, 51.447254),
        (34.023755, -3, 51.447254),
    ]]
    chamfer(f14_edges, length=F14_SIZE)


solid = f1.part
